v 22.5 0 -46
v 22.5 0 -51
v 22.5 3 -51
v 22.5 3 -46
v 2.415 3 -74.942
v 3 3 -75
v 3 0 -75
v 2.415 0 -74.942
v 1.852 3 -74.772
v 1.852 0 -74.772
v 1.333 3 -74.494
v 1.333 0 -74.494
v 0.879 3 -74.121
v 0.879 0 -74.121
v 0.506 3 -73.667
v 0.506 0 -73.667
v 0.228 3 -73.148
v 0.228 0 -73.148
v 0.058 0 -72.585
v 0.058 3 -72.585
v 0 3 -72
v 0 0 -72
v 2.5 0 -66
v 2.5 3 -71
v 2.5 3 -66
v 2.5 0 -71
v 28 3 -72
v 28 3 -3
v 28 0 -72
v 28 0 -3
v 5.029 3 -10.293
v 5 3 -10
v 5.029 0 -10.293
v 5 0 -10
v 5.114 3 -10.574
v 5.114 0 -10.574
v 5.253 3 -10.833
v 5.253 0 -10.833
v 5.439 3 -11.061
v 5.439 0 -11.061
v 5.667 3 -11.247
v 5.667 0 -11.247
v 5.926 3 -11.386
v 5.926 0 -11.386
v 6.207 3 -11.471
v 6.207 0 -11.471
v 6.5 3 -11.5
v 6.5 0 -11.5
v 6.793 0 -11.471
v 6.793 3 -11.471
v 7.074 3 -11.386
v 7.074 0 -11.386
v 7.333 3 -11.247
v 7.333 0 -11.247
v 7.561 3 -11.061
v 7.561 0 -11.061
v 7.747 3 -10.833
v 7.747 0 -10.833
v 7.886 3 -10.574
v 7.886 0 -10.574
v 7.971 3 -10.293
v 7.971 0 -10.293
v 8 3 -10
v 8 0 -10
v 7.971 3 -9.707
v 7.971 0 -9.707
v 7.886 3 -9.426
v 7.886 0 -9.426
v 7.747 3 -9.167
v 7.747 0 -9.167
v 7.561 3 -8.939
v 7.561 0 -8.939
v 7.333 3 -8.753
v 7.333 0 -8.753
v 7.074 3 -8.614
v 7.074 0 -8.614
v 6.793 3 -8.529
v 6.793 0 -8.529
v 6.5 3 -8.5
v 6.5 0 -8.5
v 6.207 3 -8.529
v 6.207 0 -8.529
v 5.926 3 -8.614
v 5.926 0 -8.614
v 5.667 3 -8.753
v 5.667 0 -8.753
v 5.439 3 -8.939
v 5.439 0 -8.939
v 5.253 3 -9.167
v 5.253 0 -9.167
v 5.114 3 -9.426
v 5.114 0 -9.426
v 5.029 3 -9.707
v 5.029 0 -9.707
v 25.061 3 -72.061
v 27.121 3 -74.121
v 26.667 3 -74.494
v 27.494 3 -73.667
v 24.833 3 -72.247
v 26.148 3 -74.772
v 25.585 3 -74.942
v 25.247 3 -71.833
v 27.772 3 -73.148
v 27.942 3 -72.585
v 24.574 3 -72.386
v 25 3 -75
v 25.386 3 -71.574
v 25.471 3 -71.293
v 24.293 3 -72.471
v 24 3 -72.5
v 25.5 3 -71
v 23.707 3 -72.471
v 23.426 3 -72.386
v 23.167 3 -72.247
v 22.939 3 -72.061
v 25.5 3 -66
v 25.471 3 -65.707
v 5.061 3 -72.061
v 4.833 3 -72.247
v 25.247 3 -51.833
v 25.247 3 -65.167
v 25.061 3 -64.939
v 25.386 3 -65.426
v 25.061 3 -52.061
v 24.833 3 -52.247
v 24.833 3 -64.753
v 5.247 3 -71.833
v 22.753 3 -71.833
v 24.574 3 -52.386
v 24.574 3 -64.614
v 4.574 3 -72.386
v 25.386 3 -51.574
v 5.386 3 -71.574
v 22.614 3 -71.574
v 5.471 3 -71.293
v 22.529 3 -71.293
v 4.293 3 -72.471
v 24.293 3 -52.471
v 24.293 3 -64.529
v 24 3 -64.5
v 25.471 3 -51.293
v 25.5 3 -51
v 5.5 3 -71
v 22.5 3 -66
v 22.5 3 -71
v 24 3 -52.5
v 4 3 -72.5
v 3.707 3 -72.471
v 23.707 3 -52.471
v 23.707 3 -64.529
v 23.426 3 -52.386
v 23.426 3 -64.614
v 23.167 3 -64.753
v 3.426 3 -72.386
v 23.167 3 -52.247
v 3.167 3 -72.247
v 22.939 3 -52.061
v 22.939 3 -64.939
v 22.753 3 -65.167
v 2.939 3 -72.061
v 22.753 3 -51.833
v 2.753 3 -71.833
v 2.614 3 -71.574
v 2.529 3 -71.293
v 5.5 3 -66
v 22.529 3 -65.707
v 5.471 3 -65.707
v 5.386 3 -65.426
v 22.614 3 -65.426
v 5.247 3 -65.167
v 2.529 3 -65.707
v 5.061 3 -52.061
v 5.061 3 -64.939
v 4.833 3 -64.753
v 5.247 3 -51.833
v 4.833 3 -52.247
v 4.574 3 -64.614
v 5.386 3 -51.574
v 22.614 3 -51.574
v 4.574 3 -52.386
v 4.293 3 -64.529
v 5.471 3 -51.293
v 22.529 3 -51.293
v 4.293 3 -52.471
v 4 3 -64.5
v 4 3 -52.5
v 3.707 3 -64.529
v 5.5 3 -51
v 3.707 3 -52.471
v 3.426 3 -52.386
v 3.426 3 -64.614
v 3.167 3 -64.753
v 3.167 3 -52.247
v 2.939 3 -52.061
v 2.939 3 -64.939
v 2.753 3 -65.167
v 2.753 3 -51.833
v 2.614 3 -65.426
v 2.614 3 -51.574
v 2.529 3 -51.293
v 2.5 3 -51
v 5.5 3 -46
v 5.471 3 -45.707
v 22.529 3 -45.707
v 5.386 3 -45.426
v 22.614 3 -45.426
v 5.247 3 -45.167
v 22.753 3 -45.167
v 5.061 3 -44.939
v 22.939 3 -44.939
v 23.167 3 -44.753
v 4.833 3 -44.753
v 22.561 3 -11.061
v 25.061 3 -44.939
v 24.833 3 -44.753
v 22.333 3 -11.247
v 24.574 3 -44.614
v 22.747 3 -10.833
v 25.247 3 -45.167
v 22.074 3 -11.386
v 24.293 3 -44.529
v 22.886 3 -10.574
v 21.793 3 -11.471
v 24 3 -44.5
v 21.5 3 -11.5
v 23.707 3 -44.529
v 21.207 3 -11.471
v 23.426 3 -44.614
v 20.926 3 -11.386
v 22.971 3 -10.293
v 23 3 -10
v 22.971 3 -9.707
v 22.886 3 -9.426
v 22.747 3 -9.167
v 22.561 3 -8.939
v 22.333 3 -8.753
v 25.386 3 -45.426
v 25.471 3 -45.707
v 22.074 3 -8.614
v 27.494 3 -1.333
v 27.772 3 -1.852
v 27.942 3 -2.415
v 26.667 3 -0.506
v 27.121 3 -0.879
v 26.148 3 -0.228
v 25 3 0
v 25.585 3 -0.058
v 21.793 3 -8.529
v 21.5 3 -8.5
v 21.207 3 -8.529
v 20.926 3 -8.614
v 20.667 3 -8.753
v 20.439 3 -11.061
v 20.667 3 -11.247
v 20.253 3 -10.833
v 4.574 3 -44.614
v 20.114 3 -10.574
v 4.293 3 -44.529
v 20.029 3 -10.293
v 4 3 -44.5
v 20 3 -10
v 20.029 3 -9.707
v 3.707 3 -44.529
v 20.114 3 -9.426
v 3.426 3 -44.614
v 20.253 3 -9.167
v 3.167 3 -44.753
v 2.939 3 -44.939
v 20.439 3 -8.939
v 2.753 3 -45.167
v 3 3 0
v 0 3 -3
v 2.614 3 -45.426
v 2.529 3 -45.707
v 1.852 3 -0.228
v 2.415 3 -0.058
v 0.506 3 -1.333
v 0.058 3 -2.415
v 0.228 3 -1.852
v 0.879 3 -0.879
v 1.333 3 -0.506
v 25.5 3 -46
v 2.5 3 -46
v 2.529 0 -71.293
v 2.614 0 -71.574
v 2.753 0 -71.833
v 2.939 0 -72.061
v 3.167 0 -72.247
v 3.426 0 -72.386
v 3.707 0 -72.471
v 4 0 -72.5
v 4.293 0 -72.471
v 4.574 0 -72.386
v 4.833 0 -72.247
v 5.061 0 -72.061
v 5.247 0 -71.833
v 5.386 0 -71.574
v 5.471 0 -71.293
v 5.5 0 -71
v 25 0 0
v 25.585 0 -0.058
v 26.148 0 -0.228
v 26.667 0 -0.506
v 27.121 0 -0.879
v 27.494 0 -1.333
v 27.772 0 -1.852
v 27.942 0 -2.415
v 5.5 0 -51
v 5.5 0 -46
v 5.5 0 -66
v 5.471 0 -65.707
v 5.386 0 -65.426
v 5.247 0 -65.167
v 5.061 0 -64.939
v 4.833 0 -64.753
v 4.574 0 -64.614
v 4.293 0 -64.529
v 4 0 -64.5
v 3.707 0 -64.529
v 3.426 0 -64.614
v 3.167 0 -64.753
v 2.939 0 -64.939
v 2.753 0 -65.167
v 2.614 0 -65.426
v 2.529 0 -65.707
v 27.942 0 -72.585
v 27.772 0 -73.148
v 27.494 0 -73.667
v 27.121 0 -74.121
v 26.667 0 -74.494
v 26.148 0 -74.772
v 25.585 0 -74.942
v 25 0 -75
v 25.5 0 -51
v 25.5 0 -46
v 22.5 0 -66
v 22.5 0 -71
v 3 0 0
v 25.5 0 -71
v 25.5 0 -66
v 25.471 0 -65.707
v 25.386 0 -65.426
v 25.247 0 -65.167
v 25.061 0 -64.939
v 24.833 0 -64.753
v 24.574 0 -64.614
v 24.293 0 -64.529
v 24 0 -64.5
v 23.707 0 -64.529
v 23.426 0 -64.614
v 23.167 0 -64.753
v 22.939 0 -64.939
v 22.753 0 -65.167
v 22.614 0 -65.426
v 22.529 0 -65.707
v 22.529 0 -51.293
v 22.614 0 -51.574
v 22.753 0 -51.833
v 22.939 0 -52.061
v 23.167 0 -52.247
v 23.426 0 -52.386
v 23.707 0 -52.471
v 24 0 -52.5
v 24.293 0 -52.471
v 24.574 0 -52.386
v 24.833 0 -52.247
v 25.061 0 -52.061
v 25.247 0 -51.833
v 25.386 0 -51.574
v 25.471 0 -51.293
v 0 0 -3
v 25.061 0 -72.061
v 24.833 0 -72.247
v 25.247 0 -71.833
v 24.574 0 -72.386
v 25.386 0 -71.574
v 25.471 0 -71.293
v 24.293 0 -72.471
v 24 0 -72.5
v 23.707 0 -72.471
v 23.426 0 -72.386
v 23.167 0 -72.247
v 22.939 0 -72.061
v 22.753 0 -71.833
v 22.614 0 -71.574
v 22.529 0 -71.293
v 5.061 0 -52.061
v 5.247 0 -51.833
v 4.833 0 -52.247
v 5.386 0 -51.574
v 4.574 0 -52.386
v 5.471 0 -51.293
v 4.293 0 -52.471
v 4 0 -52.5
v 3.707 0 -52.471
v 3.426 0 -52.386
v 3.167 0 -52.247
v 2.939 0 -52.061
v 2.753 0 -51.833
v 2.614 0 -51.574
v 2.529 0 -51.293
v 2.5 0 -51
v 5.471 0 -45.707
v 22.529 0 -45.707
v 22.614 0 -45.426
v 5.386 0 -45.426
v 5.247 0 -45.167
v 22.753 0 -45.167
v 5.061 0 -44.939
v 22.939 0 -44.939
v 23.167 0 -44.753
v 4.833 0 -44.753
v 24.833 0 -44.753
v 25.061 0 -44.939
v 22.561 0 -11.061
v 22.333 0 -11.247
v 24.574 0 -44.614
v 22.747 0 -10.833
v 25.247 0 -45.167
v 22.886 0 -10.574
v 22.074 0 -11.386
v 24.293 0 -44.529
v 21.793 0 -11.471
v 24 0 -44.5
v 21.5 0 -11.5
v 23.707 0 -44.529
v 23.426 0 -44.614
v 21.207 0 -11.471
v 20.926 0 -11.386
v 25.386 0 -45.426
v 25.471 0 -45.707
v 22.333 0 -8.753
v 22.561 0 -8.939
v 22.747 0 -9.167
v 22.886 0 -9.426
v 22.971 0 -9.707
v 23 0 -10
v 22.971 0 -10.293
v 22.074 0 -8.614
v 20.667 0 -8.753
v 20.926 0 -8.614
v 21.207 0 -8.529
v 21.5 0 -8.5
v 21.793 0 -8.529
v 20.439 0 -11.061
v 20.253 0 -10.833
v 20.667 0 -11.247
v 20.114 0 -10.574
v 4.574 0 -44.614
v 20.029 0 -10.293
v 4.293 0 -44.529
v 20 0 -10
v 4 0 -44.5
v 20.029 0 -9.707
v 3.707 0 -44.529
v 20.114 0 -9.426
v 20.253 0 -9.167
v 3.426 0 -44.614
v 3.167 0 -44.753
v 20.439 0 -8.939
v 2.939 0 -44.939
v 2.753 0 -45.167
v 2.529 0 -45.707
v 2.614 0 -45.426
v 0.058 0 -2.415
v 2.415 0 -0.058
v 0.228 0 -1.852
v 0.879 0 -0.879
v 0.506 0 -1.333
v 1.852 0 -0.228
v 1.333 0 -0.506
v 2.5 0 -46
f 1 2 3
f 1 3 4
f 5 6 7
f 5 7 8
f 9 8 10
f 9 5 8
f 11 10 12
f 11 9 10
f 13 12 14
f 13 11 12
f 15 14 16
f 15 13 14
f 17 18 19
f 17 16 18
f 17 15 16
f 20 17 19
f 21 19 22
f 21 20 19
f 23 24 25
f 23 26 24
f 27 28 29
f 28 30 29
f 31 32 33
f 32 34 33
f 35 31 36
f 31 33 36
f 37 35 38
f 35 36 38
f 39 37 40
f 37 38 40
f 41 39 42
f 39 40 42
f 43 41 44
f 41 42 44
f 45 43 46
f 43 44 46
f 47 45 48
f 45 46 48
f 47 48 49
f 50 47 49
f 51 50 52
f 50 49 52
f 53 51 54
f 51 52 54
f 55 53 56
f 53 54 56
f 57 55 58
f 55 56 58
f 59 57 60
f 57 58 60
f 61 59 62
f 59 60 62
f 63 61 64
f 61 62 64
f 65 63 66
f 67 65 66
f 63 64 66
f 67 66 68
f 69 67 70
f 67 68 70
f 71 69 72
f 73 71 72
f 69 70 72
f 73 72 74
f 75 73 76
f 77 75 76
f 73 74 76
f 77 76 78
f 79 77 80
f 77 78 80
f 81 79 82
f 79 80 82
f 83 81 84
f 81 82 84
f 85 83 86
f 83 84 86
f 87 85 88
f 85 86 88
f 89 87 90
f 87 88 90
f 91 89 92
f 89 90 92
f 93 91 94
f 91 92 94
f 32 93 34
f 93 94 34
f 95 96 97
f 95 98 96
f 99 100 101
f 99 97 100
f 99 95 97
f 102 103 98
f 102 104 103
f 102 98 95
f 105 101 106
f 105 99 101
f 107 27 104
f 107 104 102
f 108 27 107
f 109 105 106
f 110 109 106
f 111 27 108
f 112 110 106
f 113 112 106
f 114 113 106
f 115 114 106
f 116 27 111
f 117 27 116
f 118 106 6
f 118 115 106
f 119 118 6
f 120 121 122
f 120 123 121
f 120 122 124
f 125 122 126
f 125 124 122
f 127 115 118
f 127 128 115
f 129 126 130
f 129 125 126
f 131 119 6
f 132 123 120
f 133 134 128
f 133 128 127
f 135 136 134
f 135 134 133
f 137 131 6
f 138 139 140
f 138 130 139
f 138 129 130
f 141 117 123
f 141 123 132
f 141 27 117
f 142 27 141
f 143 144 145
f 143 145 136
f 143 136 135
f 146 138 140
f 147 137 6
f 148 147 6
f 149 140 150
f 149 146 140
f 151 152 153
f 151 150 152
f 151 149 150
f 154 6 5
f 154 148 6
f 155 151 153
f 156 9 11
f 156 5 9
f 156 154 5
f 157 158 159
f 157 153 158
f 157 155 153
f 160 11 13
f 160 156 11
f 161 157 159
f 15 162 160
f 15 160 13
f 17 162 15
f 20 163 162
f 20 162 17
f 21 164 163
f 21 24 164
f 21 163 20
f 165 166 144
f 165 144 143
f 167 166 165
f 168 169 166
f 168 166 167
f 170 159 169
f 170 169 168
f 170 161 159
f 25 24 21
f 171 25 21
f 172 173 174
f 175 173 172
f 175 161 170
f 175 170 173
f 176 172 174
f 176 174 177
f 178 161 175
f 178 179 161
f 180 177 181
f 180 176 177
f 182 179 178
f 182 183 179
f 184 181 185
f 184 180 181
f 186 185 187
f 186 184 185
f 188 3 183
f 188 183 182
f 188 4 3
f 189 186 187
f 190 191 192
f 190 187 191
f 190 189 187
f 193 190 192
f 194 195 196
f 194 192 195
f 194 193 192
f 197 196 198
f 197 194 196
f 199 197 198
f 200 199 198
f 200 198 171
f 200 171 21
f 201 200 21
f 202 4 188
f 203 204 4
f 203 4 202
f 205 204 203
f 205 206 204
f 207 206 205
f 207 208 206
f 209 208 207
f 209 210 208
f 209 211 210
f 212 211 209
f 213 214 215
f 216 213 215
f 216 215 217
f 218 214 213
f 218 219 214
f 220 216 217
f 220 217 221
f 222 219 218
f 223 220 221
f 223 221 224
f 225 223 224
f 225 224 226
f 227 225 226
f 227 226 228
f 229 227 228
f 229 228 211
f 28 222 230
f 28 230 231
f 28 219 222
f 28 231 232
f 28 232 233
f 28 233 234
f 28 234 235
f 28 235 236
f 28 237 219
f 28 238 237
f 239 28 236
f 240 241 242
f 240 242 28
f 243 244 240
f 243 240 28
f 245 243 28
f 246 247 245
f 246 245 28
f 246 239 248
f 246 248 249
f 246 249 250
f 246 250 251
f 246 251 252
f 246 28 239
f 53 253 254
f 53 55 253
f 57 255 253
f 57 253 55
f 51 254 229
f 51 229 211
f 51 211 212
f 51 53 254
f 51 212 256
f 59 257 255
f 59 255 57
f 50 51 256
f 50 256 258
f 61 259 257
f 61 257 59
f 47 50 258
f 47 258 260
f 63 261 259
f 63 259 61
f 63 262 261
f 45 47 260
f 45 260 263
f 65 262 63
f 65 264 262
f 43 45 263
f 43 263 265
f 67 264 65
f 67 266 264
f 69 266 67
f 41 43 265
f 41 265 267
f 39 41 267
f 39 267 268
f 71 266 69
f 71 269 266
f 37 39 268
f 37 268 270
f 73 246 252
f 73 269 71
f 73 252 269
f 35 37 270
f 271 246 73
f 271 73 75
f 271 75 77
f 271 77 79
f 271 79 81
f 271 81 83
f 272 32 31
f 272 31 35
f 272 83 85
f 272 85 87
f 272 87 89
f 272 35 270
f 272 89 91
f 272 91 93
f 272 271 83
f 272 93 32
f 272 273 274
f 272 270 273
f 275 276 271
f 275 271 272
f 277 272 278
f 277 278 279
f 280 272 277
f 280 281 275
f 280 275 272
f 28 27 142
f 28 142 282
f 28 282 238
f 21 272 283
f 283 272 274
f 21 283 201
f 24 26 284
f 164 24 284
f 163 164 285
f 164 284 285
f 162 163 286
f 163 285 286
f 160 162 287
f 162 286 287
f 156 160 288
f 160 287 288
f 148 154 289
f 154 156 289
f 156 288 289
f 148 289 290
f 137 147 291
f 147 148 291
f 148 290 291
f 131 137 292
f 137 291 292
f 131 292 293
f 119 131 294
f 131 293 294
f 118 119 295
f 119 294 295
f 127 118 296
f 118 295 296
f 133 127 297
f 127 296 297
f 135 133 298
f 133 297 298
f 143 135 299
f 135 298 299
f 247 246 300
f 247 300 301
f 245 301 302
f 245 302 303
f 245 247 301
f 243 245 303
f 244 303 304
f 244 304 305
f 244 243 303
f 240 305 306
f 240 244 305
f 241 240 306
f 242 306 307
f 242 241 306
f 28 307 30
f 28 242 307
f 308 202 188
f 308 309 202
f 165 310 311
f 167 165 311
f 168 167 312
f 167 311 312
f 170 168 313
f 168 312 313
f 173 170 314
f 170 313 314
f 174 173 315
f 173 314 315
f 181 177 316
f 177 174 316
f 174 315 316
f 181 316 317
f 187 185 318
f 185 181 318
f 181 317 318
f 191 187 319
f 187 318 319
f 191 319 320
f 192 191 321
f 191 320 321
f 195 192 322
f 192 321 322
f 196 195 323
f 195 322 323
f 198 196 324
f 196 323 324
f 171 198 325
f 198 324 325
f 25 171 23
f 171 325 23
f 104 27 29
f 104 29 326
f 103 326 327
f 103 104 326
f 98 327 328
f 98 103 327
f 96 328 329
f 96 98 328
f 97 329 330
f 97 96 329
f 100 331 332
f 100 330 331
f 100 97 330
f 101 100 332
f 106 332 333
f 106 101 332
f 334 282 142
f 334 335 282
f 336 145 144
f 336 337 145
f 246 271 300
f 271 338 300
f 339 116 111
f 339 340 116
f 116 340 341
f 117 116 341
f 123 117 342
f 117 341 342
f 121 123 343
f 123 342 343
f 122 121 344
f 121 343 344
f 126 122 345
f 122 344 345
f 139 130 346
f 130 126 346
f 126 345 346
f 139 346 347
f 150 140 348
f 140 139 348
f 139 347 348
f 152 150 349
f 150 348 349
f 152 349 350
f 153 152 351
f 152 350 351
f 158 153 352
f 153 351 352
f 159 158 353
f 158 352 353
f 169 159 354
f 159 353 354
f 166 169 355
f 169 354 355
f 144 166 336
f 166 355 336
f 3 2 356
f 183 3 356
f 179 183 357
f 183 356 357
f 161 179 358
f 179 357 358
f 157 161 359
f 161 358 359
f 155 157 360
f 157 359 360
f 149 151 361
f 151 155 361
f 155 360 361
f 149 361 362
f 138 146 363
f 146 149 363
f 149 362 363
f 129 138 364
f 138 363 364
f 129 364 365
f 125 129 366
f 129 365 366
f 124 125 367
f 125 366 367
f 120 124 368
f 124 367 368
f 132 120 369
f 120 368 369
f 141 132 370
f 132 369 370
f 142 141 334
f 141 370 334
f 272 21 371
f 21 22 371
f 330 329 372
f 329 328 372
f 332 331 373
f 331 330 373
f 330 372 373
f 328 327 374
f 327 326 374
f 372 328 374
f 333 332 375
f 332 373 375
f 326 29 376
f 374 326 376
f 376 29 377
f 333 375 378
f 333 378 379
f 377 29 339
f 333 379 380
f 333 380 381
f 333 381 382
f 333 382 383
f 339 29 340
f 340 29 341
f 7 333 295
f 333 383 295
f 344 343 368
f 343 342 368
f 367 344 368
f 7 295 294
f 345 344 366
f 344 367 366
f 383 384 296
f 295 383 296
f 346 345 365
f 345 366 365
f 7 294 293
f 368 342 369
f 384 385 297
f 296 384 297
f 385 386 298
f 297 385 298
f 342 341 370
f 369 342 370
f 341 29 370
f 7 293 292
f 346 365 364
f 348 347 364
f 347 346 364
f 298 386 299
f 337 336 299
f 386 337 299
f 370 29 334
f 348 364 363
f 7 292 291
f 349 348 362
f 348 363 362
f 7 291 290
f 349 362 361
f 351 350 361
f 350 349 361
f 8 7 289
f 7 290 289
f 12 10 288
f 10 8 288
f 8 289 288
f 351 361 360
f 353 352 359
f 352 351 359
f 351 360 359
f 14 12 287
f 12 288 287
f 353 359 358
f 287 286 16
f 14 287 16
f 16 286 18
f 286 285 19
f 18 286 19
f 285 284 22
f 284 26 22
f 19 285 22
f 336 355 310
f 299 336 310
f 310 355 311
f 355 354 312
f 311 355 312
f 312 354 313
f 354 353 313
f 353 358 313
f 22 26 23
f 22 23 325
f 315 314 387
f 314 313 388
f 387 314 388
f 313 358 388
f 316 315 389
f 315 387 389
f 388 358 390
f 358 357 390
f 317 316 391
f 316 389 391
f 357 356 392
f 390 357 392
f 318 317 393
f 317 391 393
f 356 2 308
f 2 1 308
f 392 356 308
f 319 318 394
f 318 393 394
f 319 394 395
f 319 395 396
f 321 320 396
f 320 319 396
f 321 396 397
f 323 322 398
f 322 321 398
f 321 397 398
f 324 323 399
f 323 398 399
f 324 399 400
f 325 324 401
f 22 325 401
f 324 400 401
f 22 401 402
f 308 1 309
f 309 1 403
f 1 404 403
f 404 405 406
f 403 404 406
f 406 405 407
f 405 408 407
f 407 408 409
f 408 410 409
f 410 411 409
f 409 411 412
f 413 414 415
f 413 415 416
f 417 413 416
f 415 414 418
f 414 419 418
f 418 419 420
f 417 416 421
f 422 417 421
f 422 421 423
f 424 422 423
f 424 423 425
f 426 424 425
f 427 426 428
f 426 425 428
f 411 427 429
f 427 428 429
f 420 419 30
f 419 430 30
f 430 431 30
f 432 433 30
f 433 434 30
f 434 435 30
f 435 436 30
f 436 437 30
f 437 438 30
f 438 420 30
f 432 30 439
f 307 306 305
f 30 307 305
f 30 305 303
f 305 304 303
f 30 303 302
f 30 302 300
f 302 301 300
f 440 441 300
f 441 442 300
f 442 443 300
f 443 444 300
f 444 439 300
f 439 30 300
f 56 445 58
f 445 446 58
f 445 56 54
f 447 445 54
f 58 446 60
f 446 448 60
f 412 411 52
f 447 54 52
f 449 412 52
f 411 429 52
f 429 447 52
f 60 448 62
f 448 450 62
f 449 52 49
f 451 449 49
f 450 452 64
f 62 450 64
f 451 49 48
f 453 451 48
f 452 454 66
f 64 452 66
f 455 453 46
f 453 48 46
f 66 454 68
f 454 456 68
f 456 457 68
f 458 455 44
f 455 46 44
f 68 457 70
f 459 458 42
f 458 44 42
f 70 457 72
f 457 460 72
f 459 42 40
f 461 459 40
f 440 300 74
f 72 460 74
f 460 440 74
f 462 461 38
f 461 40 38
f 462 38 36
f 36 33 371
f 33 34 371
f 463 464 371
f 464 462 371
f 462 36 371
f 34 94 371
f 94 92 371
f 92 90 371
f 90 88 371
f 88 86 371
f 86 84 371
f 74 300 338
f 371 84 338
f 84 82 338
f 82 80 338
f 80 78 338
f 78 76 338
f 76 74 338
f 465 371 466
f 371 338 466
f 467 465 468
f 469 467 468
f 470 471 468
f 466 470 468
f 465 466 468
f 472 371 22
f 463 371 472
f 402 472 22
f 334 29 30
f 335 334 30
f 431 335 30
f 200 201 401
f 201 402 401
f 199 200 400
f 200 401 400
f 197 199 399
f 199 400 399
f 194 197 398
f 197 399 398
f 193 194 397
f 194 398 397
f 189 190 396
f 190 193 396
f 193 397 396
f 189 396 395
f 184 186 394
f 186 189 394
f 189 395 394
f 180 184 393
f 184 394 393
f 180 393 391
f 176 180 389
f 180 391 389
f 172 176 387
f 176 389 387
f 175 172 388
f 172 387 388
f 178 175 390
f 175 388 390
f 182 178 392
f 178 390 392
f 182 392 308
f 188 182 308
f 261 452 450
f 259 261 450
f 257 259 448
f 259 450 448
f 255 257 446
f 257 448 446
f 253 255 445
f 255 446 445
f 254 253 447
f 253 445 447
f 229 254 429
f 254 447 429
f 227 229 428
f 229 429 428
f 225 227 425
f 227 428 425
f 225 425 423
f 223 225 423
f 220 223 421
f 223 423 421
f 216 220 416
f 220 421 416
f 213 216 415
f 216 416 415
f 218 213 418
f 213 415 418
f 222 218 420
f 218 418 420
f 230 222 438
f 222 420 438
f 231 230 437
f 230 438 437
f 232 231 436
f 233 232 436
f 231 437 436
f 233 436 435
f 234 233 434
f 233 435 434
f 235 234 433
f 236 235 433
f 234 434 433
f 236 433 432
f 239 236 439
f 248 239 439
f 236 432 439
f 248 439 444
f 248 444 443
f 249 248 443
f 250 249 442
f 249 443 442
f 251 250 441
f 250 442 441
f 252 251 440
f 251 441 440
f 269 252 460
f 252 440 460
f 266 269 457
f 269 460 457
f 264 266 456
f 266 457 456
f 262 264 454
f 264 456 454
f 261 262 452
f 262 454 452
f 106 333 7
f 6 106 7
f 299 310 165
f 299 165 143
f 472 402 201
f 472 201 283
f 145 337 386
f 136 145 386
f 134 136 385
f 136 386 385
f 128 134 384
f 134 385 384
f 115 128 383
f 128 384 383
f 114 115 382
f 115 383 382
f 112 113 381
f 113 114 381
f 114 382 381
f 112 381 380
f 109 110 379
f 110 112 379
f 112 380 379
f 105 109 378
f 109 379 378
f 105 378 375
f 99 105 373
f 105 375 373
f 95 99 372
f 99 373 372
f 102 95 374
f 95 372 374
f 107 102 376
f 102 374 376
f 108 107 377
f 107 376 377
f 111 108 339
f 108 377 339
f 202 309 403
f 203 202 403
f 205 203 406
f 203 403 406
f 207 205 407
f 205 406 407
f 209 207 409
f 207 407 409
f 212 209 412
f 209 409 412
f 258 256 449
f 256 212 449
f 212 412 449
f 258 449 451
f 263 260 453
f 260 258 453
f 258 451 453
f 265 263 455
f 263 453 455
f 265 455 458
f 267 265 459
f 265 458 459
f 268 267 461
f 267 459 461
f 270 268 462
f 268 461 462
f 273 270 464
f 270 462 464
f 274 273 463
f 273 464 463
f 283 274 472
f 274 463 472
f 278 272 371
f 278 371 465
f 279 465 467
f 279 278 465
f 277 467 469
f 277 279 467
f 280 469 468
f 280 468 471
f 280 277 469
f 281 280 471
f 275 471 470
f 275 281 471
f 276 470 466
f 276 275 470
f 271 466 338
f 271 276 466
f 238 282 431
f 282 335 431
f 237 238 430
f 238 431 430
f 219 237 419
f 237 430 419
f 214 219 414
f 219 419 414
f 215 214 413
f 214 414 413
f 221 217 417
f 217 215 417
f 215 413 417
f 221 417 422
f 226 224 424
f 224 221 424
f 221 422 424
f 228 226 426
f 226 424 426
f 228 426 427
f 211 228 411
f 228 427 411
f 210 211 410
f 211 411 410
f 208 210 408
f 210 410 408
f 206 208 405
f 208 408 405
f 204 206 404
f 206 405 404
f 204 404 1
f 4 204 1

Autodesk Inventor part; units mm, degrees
ref_plane "YZ Plane" through (0, 0, 0) normal (1, 0, 0) x (0, 1, 0)
ref_plane "XZ Plane" through (0, 0, 0) normal (0, 1, 0) x (-1, 0, 0)
ref_plane "XY Plane" through (0, 0, 0) normal (0, 0, 1) x (1, 0, 0)
sketch "Sketch1" plane through (0, 0, 0) normal (0, 1, 0) x (-1, 0, 0)
  line L0 (0, 0) -> (-28, 0)
  line L1 (-28, 0) -> (-28, -75)
  line L2 (-28, -75) -> (0, -75)
  line L3 (0, -75) -> (0, 0)
  line L4 (-4, -51) -> (-24, -51) construction
  line L5 (-24, -51) -> (-24, -71) construction
  line L6 (-24, -71) -> (-4, -71) construction
  line L7 (-4, -71) -> (-4, -51) construction
  line L8 (-4, -51) -> (-24, -71) construction
  line L9 (-24, -51) -> (-4, -71) construction
  line L10 (-4, -71) -> (-4, -66) construction
  line L11 (-2.5, -71) -> (-2.5, -66)
  line L12 (-5.5, -66) -> (-5.5, -71)
  arc A0 (-5.5, -71) -> (-2.5, -71) centre (-4, -71) ccw
  arc A1 (-2.5, -66) -> (-5.5, -66) centre (-4, -66) ccw
  line L13 (-24, -71) -> (-24, -66) construction
  line L14 (-22.5, -71) -> (-22.5, -66)
  line L15 (-25.5, -66) -> (-25.5, -71)
  arc A2 (-25.5, -71) -> (-22.5, -71) centre (-24, -71) ccw
  arc A3 (-22.5, -66) -> (-25.5, -66) centre (-24, -66) ccw
  line L16 (-4, -51) -> (-4, -46) construction
  line L17 (-2.5, -51) -> (-2.5, -46)
  line L18 (-5.5, -46) -> (-5.5, -51)
  arc A4 (-5.5, -51) -> (-2.5, -51) centre (-4, -51) ccw
  arc A5 (-2.5, -46) -> (-5.5, -46) centre (-4, -46) ccw
  line L19 (-24, -51) -> (-24, -46) construction
  line L20 (-22.5, -51) -> (-22.5, -46)
  line L21 (-25.5, -46) -> (-25.5, -51)
  arc A6 (-25.5, -51) -> (-22.5, -51) centre (-24, -51) ccw
  arc A7 (-22.5, -46) -> (-25.5, -46) centre (-24, -46) ccw
  circle A8 centre (-6.5, -10) radius 1.5
  circle A9 centre (-21.5, -10) radius 1.5
  line L22 (-6.5, -10) -> (-21.5, -10) construction
  point P0 (-14, -61)
  point P1 (-14, -61)
  point P2 (-14, -75)
  point P3 (-4, -68.5)
  point P4 (-24, -68.5)
  point P5 (-4, -48.5)
  point P6 (-24, -48.5)
  point P7 (-14, -10)
  point P8 (-14, 0)
  dimension "d0" = 75
  dimension "d1" = 28
  dimension "d2" = 20
  dimension "d3" = 20
  dimension "d4" = 4
  dimension "d5" = 5
  dimension "d6" = 3
  dimension "d7" = 5
  dimension "d8" = 3
  dimension "d9" = 5
  dimension "d10" = 3
  dimension "d11" = 5
  dimension "d12" = 3
  dimension "d16" = 3
  dimension "d17" = 3
  dimension "d18" = 15
  dimension "d19" = 10
extrude "Extrusion1" add sketch "Sketch1" along normal blind 3 contours L3 L2 L1 L0 | A8 | A9
fillet "Fillet1" radius 3 4 edges at (0, 1.5, 0) (28, 1.5, 0) (0, 1.5, -75) (28, 1.5, -75)
extrude "Extrusion2" cut sketch "Sketch1" along normal through all contours A8 | A9
properties part number "EncoderPCBMount" material "ABS Plastic"
